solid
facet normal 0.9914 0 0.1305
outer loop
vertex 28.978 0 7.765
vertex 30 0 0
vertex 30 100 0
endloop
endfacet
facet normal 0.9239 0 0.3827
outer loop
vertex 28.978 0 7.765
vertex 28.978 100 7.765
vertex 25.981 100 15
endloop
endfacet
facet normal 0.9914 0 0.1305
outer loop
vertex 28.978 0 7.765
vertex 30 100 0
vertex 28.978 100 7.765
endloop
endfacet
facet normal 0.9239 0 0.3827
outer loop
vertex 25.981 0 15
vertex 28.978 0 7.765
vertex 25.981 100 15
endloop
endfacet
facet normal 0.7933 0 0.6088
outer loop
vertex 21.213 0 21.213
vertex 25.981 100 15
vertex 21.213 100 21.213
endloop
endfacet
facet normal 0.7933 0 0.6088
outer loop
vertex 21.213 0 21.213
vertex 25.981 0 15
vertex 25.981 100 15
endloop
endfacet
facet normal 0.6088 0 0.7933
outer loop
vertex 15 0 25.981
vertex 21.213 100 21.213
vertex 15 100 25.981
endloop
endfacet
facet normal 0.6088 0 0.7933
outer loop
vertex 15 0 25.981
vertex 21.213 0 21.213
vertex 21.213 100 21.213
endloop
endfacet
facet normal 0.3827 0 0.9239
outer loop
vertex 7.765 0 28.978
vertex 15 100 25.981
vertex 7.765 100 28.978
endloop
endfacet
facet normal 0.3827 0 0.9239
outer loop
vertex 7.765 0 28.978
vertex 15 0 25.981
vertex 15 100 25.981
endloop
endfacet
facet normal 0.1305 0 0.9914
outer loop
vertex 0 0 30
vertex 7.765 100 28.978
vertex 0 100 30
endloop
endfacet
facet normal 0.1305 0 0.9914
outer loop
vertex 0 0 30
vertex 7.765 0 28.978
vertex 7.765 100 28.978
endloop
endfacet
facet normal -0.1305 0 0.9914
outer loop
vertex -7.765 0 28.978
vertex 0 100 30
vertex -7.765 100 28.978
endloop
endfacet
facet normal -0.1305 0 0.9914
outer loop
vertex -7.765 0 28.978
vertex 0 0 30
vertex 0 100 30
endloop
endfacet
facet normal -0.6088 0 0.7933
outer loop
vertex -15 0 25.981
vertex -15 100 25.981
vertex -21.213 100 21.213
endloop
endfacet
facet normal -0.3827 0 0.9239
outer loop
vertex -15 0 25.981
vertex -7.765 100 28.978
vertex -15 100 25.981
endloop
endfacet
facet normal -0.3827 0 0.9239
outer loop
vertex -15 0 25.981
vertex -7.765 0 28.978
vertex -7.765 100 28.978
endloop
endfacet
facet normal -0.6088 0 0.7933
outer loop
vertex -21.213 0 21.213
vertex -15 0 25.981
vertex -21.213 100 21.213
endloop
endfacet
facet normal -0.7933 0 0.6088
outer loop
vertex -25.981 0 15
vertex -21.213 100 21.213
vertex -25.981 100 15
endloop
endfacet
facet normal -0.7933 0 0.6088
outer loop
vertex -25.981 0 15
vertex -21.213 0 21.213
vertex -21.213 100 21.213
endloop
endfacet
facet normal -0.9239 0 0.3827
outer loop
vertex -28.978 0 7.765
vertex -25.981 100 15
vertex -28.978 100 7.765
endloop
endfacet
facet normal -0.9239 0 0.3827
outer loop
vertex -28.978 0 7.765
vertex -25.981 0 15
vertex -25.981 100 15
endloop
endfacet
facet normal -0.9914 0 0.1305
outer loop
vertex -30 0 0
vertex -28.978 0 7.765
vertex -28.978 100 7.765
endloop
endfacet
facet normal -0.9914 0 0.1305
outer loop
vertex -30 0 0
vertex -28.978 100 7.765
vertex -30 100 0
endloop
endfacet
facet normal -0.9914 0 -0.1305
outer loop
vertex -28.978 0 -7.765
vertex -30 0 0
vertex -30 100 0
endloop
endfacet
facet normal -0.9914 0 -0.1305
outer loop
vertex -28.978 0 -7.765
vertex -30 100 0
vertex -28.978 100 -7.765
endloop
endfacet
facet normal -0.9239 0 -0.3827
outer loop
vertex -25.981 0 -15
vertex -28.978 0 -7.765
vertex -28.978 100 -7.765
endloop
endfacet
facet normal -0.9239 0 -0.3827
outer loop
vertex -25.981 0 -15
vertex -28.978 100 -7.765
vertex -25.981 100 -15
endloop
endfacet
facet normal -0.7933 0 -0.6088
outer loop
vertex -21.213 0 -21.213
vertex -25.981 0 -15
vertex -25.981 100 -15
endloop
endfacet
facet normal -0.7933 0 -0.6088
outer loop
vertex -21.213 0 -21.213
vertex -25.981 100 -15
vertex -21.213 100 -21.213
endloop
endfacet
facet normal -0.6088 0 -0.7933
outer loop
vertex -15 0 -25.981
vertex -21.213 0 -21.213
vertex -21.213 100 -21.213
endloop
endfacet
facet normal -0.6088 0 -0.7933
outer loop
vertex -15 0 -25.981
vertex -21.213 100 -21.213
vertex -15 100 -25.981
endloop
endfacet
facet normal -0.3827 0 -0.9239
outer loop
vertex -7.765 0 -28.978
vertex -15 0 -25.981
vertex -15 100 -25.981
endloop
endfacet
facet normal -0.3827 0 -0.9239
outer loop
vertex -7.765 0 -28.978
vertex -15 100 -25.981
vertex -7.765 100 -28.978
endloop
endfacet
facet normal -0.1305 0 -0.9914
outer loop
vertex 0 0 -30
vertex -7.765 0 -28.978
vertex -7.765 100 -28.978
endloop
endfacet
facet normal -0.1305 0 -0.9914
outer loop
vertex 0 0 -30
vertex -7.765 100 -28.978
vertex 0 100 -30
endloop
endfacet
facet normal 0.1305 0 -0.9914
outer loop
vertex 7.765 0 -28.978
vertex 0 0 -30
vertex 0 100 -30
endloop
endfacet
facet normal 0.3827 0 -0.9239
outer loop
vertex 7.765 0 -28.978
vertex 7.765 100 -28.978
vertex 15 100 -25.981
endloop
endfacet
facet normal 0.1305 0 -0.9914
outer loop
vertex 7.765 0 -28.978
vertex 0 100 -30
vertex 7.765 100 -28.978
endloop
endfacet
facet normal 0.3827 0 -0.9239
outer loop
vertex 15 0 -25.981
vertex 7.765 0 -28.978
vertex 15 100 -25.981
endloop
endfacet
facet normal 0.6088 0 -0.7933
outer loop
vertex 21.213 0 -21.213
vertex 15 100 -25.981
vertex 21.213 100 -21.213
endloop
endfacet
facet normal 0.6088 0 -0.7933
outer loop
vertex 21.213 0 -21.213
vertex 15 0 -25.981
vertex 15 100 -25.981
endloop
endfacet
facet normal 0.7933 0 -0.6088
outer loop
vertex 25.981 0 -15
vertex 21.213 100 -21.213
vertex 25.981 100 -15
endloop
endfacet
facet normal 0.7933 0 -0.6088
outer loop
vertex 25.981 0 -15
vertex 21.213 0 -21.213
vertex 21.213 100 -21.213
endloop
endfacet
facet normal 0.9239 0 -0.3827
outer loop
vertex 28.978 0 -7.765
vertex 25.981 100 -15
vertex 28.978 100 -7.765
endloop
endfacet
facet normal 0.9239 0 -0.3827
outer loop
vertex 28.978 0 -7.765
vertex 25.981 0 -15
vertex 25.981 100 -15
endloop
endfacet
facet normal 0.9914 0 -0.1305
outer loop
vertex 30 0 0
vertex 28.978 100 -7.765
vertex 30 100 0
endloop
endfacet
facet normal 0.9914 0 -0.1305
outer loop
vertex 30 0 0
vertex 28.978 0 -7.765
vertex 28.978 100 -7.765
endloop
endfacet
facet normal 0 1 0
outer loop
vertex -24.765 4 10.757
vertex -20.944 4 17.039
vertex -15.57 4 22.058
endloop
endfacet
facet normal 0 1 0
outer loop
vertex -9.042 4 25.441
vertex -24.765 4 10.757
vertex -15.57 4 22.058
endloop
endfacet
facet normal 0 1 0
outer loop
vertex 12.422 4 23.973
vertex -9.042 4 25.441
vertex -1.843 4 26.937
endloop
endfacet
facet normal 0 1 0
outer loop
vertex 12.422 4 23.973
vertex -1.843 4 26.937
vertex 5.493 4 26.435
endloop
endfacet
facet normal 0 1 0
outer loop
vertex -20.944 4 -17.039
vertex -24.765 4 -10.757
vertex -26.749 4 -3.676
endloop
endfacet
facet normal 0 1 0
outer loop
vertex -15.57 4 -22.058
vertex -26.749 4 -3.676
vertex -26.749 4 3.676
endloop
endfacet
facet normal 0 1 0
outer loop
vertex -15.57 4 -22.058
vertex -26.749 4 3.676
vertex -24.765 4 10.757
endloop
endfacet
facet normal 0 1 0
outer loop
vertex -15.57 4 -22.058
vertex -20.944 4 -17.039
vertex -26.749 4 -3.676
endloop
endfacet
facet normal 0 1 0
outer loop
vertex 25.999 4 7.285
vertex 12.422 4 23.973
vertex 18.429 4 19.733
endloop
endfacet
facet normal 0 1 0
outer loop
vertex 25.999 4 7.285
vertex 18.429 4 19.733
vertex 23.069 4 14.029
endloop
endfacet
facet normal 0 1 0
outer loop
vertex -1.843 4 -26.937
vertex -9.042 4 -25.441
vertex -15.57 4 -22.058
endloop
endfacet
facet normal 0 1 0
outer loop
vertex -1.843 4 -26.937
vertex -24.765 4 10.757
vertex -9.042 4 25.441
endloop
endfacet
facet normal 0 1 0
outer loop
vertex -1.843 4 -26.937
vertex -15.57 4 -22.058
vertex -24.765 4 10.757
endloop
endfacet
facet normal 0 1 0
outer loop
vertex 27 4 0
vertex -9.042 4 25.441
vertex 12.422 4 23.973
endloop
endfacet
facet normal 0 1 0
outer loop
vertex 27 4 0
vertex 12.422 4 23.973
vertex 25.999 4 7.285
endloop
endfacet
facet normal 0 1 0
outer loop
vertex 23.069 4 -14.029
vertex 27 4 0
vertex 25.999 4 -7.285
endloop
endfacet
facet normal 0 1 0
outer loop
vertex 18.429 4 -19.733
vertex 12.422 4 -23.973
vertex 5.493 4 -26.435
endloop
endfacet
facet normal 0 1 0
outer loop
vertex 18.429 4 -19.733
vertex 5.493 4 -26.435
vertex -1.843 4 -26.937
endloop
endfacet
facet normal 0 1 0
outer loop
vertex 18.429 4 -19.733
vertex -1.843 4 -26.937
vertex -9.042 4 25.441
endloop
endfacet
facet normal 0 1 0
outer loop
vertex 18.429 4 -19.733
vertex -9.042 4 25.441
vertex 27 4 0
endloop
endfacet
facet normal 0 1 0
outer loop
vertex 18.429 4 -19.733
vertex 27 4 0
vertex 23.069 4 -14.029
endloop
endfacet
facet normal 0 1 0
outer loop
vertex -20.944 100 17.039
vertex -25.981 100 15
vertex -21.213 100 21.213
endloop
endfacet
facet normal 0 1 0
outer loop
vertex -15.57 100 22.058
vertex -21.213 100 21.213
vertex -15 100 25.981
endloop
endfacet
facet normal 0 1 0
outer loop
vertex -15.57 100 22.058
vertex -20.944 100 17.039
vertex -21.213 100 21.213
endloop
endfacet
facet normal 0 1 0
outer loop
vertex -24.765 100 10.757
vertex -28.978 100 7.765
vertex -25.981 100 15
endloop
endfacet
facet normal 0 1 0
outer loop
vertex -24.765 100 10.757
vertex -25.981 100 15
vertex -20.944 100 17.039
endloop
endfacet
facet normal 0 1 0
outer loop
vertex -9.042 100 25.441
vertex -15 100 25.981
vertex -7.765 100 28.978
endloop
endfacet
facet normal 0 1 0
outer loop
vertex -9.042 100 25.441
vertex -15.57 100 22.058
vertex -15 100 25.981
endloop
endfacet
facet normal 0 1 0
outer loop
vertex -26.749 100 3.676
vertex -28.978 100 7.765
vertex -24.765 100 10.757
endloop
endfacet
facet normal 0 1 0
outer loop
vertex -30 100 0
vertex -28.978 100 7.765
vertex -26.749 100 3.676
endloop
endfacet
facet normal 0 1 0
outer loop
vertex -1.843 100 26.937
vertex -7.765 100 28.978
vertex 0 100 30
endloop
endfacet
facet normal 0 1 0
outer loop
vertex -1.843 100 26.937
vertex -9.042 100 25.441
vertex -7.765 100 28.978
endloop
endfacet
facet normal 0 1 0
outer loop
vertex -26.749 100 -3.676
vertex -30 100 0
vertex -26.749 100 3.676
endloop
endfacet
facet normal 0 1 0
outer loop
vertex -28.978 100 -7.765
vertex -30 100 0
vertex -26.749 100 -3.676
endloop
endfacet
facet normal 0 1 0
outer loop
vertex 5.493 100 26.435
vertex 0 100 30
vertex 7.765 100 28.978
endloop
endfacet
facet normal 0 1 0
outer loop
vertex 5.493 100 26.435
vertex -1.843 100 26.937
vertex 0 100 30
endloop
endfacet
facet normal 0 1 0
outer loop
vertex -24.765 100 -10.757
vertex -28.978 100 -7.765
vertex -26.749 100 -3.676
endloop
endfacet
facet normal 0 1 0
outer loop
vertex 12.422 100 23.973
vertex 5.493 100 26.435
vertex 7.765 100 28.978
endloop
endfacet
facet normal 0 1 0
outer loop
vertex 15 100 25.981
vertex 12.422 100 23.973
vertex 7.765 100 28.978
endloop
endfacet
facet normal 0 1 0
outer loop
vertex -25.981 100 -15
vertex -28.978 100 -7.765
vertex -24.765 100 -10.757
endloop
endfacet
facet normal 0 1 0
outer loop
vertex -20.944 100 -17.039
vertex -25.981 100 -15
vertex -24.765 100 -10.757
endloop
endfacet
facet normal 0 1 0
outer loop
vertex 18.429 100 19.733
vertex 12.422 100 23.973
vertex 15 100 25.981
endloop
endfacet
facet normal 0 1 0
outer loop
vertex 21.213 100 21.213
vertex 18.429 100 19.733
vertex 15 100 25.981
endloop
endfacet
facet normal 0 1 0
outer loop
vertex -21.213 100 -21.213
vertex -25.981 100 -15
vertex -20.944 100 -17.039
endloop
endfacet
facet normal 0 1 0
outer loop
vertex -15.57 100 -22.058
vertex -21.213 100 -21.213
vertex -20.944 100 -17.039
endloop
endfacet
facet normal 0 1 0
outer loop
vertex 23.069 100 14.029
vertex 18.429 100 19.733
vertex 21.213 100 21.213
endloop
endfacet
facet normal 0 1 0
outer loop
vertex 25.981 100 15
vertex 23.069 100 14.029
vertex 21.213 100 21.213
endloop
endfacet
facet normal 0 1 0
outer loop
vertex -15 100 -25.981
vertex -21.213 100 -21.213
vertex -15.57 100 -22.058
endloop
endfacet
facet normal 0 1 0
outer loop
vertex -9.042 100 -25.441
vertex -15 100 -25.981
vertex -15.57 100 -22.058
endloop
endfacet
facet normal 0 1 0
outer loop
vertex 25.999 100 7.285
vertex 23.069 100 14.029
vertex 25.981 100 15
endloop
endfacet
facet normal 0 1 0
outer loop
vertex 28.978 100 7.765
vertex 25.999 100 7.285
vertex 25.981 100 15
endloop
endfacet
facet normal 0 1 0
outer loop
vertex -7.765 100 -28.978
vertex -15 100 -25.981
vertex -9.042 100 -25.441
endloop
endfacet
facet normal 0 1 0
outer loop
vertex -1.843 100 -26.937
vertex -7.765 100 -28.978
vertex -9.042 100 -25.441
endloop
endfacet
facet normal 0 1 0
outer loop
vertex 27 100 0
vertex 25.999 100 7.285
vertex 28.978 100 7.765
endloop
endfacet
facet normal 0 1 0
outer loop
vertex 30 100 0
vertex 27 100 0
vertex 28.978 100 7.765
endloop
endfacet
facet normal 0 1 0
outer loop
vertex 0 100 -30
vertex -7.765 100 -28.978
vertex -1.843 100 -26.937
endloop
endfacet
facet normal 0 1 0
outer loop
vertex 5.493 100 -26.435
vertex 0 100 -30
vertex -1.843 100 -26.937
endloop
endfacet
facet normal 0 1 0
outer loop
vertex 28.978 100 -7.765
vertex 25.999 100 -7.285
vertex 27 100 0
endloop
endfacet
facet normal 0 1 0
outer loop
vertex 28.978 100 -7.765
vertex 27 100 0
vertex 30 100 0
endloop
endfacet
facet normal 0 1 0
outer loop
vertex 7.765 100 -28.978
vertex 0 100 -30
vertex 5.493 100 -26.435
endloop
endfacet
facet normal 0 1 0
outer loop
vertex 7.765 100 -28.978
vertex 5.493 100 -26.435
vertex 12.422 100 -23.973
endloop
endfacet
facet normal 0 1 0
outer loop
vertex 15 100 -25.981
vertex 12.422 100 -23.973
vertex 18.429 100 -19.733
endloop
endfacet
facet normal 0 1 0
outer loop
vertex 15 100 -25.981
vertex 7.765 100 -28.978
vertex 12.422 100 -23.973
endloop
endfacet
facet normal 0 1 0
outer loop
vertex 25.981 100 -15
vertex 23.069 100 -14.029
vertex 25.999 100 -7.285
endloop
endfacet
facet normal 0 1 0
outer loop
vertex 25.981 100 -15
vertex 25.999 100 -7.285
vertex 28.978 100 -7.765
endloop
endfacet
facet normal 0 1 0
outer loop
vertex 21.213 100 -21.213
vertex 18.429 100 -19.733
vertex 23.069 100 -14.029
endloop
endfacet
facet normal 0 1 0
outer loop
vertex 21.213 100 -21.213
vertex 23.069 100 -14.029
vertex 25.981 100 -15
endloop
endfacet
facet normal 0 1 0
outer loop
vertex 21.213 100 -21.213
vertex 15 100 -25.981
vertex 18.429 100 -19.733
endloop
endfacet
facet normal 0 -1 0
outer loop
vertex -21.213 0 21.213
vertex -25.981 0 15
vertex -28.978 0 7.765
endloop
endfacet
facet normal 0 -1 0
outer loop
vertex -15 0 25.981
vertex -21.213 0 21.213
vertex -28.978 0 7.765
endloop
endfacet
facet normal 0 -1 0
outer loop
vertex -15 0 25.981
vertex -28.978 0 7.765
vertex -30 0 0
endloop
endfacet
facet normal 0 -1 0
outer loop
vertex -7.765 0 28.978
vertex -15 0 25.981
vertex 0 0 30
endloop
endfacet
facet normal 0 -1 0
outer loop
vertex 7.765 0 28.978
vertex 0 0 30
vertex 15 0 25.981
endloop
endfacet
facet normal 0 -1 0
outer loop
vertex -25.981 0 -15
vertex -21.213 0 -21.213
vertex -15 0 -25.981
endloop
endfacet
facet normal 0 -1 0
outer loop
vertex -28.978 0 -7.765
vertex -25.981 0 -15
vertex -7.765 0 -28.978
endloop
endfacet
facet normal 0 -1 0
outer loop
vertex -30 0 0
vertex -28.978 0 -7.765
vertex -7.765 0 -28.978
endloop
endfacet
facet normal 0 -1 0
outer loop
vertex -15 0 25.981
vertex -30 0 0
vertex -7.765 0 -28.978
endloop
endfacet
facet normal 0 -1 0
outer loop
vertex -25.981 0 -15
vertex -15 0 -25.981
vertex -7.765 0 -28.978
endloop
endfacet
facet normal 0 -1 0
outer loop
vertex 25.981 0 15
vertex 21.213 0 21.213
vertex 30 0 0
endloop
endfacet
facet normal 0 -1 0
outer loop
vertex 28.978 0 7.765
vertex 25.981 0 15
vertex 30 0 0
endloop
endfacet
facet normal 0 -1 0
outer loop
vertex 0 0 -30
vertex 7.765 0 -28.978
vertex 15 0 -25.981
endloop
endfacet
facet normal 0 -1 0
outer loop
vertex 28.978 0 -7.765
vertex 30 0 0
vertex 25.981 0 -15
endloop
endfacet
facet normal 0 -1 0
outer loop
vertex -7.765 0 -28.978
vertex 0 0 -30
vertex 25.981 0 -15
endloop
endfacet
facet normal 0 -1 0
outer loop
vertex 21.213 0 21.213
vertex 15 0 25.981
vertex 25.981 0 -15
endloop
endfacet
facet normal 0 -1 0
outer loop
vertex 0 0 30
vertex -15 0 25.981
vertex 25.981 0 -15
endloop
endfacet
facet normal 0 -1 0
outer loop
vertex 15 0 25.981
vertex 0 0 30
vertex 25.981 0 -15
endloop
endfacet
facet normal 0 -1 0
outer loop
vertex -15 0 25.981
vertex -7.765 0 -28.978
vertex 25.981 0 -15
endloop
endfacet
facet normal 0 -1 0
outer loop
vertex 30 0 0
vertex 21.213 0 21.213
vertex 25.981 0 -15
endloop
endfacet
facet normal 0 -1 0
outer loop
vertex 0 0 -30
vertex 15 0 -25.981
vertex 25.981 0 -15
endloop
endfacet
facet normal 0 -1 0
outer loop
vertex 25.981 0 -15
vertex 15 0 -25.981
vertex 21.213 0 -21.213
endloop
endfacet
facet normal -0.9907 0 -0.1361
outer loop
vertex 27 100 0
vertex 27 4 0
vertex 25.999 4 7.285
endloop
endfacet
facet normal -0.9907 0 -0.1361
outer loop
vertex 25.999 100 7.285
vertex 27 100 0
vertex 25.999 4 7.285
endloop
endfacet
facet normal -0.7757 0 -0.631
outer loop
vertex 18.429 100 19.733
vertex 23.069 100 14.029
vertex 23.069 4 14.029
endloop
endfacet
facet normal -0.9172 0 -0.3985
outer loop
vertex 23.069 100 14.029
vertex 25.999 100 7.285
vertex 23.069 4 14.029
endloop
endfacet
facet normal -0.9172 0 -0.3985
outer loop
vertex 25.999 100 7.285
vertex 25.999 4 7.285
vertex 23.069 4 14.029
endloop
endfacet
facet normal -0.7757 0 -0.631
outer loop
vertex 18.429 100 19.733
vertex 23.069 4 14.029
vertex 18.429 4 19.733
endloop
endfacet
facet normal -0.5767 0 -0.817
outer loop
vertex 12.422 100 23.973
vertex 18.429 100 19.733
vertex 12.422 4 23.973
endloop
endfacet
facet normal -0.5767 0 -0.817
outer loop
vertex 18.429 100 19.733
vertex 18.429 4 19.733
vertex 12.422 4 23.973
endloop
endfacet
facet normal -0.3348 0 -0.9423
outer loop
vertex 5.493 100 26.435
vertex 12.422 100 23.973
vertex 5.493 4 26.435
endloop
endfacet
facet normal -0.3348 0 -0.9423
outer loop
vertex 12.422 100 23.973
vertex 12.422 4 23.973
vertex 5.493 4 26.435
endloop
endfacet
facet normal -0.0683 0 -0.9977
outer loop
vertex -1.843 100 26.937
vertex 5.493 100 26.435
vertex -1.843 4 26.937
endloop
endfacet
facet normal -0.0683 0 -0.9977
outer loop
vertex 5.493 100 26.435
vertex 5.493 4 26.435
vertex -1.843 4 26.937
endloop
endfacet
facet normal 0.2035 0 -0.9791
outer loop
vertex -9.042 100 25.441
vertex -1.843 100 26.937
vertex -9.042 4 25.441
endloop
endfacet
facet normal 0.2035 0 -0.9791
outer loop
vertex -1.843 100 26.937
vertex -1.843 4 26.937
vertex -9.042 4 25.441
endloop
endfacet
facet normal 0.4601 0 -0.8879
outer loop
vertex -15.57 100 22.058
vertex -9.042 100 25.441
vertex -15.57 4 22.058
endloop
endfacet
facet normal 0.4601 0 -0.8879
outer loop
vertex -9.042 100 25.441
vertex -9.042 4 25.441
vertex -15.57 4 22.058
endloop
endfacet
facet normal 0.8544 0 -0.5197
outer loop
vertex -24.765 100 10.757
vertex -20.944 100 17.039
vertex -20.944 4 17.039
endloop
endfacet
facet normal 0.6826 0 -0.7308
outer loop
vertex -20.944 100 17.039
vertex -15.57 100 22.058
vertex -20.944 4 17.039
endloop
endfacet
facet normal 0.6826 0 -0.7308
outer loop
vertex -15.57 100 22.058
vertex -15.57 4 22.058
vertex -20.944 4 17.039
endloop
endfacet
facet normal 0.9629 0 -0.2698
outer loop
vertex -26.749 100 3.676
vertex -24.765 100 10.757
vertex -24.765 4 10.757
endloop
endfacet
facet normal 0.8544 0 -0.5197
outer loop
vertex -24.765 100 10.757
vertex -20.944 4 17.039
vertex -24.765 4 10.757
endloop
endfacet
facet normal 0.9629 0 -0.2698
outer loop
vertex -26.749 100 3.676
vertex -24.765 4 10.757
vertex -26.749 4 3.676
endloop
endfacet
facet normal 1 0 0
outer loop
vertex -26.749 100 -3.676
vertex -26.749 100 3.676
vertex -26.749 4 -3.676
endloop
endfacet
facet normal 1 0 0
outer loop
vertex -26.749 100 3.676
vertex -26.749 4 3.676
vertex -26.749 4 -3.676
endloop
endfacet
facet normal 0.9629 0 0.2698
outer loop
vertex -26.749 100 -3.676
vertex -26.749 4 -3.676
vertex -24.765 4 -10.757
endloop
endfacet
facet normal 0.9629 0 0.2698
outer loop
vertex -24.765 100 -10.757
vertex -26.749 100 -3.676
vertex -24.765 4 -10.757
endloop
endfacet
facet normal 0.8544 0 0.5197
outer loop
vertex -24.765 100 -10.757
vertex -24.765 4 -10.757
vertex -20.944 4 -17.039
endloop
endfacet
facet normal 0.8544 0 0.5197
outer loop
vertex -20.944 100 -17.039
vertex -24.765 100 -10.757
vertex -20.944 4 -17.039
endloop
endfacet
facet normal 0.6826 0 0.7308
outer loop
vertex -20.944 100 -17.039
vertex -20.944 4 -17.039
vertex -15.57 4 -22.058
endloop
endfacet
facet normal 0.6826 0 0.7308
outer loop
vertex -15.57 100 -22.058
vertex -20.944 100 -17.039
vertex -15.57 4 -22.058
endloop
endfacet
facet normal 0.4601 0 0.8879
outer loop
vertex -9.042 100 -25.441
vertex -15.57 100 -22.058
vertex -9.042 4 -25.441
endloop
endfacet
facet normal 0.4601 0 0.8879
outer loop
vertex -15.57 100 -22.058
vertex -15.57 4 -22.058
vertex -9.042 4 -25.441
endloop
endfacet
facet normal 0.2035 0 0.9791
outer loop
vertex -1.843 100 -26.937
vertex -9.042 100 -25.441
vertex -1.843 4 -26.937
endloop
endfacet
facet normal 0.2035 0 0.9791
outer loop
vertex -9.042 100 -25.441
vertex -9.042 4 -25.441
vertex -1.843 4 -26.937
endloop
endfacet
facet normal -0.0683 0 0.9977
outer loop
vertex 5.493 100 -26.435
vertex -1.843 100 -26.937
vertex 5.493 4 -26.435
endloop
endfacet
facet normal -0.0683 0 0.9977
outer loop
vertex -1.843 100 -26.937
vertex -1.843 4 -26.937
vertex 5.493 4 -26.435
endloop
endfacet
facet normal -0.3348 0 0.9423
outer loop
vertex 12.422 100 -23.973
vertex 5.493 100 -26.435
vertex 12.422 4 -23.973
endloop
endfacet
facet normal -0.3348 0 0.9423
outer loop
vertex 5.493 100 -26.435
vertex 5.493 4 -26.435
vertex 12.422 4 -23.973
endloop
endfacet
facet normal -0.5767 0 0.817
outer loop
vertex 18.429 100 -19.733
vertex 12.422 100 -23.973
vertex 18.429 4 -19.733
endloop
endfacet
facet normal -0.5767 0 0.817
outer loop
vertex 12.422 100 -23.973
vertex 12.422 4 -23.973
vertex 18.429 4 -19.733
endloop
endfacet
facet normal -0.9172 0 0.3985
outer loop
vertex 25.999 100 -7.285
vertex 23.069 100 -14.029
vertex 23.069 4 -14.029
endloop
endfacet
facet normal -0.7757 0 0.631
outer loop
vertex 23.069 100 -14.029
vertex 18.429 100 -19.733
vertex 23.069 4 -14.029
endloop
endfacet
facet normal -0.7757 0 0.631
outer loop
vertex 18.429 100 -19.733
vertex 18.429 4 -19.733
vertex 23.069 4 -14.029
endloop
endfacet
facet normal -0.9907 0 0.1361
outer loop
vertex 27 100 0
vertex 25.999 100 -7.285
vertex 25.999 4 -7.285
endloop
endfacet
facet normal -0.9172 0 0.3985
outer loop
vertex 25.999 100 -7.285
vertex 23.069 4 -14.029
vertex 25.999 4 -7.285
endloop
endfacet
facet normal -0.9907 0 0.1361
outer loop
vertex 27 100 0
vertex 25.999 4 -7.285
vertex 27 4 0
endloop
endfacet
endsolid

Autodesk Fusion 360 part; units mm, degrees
sketch "Sketch1" plane through (0, 0, 0) normal (0, 1, 0) x (1, 0, 0)
  circle A0 centre (0, 0) radius 30
  circle A1 centre (0, 0) radius 27
  dimension "d1" = 60
  dimension "d7" = 3
extrude "Extrude1" add sketch "Sketch1" along normal blind 100 makes body 1
extrude "Extrude2" add sketch "Sketch1" along normal blind 4 contours A1 bodies 1
copy_body "Body->Comp1" bodies 1 removing the originals makes body 2 in component "tubeToolHolder03"
component "tubeToolHolder03" placed x (1, 0, 0) y (0, 1, 0) z (0, 0, 1) at (0, 0, 0)
